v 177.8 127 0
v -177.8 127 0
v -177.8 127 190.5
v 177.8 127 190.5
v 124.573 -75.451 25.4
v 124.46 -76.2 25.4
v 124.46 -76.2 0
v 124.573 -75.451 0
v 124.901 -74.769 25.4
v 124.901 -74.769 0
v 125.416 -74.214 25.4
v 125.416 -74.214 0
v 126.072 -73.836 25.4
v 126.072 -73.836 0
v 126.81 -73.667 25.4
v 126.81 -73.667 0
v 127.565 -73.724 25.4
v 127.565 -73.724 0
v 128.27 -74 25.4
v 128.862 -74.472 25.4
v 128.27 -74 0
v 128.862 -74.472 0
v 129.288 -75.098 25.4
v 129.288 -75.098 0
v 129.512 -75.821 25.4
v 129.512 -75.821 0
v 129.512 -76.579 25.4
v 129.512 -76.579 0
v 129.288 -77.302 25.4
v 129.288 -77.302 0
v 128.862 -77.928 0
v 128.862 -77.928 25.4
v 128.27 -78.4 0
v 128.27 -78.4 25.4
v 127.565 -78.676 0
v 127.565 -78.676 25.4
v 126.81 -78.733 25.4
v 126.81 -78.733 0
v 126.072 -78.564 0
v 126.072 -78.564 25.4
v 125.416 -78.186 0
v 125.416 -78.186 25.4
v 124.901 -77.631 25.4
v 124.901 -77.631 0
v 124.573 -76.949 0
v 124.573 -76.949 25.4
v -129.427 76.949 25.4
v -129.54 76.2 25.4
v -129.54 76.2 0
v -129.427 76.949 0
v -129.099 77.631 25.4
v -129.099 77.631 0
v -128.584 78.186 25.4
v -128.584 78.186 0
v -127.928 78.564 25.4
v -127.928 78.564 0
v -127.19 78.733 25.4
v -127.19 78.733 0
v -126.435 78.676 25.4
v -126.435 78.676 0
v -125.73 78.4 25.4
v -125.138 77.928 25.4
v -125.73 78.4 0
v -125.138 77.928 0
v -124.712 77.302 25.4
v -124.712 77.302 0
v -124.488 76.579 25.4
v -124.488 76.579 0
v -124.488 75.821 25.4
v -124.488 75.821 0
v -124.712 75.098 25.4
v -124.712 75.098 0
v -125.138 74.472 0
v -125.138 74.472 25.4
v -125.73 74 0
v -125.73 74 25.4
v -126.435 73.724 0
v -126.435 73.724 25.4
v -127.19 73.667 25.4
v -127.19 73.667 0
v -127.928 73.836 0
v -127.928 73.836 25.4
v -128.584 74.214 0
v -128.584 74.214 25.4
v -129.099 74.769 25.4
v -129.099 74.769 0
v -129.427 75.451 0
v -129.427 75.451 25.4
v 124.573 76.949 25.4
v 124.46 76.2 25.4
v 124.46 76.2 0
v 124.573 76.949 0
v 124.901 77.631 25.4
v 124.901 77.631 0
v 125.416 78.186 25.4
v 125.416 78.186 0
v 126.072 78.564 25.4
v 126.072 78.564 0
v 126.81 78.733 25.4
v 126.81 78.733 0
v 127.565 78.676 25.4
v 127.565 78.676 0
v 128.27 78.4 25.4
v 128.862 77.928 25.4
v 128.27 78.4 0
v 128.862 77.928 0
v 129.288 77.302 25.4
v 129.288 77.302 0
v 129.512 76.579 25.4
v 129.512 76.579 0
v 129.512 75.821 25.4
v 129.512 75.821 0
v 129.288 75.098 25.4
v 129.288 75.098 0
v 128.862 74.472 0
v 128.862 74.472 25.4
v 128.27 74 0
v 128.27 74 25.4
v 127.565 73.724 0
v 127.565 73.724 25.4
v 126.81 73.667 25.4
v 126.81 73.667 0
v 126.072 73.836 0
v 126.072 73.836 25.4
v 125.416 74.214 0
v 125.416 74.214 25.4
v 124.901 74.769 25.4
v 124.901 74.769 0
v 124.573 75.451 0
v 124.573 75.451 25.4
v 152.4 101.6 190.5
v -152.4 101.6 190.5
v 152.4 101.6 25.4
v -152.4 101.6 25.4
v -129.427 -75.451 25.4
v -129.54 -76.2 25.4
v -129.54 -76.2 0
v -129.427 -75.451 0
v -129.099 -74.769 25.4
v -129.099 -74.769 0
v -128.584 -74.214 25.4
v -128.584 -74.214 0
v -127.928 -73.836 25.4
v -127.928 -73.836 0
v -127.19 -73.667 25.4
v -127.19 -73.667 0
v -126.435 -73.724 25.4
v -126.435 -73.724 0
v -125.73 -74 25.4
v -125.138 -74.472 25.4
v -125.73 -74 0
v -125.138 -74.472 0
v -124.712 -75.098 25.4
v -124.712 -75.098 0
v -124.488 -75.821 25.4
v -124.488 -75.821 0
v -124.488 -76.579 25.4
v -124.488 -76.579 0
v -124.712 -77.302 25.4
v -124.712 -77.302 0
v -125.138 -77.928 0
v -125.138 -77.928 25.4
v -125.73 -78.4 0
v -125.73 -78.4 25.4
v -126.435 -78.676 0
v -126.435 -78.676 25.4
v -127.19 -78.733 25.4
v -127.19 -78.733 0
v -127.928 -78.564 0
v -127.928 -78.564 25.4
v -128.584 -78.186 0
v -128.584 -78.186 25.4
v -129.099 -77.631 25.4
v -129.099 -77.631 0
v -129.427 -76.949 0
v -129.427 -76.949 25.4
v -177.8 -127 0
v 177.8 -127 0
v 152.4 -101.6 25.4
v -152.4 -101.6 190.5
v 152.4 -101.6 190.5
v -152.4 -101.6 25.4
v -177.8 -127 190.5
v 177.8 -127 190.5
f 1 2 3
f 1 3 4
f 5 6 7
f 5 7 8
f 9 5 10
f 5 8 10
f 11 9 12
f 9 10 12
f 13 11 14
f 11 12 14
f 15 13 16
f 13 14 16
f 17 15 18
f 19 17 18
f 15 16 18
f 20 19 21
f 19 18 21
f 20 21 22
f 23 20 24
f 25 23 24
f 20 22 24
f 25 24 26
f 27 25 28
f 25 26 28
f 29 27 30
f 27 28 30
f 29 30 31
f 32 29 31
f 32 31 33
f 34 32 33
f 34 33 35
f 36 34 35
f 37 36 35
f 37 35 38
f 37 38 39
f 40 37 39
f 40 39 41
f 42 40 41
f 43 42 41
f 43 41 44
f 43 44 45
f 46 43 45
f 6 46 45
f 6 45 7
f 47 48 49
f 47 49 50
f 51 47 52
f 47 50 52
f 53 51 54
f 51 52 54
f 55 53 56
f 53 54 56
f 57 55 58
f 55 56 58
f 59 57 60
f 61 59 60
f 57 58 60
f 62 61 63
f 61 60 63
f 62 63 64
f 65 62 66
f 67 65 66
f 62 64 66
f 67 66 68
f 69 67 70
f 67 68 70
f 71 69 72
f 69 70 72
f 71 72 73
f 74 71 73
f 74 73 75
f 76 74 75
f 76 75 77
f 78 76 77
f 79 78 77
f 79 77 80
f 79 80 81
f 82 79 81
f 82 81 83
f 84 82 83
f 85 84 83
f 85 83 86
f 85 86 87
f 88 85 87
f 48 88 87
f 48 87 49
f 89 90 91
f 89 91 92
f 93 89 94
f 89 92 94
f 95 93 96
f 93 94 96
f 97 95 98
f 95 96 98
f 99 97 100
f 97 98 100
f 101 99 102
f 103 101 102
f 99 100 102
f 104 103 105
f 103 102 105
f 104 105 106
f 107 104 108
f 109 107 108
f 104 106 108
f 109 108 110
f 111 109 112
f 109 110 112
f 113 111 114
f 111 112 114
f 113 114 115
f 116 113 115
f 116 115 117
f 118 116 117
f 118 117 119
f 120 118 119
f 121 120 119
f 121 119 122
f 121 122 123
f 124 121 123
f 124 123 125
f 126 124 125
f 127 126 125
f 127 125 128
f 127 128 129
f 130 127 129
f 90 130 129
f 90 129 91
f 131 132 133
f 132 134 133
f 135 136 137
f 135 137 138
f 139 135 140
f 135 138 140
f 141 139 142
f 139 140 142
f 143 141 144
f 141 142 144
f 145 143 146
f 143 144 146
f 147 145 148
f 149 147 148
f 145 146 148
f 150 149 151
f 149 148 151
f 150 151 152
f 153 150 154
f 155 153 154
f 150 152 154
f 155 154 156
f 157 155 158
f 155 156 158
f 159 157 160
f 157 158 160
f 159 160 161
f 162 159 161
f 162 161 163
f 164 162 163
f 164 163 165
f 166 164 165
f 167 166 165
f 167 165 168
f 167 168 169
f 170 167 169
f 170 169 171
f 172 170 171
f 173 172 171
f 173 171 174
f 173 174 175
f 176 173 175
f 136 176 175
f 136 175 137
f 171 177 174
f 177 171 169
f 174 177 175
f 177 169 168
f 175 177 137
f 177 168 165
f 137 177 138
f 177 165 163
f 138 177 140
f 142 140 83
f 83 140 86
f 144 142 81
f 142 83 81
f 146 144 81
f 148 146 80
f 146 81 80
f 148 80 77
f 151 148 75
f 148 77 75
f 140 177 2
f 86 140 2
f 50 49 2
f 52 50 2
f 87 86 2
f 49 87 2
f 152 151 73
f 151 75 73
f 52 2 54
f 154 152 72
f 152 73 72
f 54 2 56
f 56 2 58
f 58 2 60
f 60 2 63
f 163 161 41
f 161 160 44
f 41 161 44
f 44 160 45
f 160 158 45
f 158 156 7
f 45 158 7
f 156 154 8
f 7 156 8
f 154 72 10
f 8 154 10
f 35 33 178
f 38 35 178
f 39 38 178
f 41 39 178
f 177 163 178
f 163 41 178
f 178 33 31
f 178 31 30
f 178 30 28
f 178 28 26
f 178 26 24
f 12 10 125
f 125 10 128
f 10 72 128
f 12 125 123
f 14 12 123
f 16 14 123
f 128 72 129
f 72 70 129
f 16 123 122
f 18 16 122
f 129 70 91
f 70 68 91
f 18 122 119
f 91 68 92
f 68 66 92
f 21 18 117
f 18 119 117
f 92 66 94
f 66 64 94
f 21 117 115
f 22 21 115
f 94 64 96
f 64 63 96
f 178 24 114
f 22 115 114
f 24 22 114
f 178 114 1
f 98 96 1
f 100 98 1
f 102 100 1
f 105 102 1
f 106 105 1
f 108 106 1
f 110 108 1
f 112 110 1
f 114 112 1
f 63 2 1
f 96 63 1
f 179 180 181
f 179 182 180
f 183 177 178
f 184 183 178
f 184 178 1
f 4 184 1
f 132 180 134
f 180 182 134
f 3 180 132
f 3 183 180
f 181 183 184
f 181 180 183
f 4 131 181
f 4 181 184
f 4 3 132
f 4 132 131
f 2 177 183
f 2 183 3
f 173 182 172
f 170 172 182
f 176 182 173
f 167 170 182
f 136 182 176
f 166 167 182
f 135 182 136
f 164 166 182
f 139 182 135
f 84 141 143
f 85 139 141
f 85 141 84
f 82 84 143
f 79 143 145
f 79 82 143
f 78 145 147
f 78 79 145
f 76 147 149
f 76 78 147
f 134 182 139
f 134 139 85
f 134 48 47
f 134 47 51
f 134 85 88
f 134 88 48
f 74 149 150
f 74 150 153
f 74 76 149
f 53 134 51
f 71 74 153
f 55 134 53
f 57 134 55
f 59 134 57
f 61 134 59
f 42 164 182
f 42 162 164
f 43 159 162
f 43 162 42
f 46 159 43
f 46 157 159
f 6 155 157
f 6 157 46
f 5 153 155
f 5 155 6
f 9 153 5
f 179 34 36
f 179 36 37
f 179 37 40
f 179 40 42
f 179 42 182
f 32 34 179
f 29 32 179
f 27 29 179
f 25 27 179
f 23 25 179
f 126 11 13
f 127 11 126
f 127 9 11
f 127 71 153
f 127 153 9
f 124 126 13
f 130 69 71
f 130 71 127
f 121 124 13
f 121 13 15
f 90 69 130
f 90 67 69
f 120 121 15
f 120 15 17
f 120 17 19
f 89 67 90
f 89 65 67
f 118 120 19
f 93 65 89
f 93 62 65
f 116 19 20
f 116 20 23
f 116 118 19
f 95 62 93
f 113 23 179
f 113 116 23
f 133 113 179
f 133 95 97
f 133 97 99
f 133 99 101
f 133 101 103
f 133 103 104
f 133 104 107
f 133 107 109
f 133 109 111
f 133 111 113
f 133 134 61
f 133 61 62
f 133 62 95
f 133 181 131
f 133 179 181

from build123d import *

# Parameters (mm, degrees)
F0_W     = 355.6
F0_H     = 254
F1_DEPTH = 190.5
F2_T     = -25.4
F4_D     = 5.08


with BuildPart() as f1:
    # F0 (on Top) → F1 (new body)
    with BuildSketch(Plane.XY):
        Rectangle(F0_W, F0_H)
    extrude(amount=F1_DEPTH)

    # F2
    f2_openings = [f1.faces().sort_by_distance(p)[0] for p in [
        (0, 0, 190.5),
    ]]
    offset(amount=F2_T, openings=f2_openings)

    # F4 (through all)
    with Locations(Plane.XY.offset(25.4)):
        with Locations((-127, 76.2), (-127, -76.2), (127, -76.2), (127, 76.2)):
            Hole(F4_D / 2)


solid = f1.part
